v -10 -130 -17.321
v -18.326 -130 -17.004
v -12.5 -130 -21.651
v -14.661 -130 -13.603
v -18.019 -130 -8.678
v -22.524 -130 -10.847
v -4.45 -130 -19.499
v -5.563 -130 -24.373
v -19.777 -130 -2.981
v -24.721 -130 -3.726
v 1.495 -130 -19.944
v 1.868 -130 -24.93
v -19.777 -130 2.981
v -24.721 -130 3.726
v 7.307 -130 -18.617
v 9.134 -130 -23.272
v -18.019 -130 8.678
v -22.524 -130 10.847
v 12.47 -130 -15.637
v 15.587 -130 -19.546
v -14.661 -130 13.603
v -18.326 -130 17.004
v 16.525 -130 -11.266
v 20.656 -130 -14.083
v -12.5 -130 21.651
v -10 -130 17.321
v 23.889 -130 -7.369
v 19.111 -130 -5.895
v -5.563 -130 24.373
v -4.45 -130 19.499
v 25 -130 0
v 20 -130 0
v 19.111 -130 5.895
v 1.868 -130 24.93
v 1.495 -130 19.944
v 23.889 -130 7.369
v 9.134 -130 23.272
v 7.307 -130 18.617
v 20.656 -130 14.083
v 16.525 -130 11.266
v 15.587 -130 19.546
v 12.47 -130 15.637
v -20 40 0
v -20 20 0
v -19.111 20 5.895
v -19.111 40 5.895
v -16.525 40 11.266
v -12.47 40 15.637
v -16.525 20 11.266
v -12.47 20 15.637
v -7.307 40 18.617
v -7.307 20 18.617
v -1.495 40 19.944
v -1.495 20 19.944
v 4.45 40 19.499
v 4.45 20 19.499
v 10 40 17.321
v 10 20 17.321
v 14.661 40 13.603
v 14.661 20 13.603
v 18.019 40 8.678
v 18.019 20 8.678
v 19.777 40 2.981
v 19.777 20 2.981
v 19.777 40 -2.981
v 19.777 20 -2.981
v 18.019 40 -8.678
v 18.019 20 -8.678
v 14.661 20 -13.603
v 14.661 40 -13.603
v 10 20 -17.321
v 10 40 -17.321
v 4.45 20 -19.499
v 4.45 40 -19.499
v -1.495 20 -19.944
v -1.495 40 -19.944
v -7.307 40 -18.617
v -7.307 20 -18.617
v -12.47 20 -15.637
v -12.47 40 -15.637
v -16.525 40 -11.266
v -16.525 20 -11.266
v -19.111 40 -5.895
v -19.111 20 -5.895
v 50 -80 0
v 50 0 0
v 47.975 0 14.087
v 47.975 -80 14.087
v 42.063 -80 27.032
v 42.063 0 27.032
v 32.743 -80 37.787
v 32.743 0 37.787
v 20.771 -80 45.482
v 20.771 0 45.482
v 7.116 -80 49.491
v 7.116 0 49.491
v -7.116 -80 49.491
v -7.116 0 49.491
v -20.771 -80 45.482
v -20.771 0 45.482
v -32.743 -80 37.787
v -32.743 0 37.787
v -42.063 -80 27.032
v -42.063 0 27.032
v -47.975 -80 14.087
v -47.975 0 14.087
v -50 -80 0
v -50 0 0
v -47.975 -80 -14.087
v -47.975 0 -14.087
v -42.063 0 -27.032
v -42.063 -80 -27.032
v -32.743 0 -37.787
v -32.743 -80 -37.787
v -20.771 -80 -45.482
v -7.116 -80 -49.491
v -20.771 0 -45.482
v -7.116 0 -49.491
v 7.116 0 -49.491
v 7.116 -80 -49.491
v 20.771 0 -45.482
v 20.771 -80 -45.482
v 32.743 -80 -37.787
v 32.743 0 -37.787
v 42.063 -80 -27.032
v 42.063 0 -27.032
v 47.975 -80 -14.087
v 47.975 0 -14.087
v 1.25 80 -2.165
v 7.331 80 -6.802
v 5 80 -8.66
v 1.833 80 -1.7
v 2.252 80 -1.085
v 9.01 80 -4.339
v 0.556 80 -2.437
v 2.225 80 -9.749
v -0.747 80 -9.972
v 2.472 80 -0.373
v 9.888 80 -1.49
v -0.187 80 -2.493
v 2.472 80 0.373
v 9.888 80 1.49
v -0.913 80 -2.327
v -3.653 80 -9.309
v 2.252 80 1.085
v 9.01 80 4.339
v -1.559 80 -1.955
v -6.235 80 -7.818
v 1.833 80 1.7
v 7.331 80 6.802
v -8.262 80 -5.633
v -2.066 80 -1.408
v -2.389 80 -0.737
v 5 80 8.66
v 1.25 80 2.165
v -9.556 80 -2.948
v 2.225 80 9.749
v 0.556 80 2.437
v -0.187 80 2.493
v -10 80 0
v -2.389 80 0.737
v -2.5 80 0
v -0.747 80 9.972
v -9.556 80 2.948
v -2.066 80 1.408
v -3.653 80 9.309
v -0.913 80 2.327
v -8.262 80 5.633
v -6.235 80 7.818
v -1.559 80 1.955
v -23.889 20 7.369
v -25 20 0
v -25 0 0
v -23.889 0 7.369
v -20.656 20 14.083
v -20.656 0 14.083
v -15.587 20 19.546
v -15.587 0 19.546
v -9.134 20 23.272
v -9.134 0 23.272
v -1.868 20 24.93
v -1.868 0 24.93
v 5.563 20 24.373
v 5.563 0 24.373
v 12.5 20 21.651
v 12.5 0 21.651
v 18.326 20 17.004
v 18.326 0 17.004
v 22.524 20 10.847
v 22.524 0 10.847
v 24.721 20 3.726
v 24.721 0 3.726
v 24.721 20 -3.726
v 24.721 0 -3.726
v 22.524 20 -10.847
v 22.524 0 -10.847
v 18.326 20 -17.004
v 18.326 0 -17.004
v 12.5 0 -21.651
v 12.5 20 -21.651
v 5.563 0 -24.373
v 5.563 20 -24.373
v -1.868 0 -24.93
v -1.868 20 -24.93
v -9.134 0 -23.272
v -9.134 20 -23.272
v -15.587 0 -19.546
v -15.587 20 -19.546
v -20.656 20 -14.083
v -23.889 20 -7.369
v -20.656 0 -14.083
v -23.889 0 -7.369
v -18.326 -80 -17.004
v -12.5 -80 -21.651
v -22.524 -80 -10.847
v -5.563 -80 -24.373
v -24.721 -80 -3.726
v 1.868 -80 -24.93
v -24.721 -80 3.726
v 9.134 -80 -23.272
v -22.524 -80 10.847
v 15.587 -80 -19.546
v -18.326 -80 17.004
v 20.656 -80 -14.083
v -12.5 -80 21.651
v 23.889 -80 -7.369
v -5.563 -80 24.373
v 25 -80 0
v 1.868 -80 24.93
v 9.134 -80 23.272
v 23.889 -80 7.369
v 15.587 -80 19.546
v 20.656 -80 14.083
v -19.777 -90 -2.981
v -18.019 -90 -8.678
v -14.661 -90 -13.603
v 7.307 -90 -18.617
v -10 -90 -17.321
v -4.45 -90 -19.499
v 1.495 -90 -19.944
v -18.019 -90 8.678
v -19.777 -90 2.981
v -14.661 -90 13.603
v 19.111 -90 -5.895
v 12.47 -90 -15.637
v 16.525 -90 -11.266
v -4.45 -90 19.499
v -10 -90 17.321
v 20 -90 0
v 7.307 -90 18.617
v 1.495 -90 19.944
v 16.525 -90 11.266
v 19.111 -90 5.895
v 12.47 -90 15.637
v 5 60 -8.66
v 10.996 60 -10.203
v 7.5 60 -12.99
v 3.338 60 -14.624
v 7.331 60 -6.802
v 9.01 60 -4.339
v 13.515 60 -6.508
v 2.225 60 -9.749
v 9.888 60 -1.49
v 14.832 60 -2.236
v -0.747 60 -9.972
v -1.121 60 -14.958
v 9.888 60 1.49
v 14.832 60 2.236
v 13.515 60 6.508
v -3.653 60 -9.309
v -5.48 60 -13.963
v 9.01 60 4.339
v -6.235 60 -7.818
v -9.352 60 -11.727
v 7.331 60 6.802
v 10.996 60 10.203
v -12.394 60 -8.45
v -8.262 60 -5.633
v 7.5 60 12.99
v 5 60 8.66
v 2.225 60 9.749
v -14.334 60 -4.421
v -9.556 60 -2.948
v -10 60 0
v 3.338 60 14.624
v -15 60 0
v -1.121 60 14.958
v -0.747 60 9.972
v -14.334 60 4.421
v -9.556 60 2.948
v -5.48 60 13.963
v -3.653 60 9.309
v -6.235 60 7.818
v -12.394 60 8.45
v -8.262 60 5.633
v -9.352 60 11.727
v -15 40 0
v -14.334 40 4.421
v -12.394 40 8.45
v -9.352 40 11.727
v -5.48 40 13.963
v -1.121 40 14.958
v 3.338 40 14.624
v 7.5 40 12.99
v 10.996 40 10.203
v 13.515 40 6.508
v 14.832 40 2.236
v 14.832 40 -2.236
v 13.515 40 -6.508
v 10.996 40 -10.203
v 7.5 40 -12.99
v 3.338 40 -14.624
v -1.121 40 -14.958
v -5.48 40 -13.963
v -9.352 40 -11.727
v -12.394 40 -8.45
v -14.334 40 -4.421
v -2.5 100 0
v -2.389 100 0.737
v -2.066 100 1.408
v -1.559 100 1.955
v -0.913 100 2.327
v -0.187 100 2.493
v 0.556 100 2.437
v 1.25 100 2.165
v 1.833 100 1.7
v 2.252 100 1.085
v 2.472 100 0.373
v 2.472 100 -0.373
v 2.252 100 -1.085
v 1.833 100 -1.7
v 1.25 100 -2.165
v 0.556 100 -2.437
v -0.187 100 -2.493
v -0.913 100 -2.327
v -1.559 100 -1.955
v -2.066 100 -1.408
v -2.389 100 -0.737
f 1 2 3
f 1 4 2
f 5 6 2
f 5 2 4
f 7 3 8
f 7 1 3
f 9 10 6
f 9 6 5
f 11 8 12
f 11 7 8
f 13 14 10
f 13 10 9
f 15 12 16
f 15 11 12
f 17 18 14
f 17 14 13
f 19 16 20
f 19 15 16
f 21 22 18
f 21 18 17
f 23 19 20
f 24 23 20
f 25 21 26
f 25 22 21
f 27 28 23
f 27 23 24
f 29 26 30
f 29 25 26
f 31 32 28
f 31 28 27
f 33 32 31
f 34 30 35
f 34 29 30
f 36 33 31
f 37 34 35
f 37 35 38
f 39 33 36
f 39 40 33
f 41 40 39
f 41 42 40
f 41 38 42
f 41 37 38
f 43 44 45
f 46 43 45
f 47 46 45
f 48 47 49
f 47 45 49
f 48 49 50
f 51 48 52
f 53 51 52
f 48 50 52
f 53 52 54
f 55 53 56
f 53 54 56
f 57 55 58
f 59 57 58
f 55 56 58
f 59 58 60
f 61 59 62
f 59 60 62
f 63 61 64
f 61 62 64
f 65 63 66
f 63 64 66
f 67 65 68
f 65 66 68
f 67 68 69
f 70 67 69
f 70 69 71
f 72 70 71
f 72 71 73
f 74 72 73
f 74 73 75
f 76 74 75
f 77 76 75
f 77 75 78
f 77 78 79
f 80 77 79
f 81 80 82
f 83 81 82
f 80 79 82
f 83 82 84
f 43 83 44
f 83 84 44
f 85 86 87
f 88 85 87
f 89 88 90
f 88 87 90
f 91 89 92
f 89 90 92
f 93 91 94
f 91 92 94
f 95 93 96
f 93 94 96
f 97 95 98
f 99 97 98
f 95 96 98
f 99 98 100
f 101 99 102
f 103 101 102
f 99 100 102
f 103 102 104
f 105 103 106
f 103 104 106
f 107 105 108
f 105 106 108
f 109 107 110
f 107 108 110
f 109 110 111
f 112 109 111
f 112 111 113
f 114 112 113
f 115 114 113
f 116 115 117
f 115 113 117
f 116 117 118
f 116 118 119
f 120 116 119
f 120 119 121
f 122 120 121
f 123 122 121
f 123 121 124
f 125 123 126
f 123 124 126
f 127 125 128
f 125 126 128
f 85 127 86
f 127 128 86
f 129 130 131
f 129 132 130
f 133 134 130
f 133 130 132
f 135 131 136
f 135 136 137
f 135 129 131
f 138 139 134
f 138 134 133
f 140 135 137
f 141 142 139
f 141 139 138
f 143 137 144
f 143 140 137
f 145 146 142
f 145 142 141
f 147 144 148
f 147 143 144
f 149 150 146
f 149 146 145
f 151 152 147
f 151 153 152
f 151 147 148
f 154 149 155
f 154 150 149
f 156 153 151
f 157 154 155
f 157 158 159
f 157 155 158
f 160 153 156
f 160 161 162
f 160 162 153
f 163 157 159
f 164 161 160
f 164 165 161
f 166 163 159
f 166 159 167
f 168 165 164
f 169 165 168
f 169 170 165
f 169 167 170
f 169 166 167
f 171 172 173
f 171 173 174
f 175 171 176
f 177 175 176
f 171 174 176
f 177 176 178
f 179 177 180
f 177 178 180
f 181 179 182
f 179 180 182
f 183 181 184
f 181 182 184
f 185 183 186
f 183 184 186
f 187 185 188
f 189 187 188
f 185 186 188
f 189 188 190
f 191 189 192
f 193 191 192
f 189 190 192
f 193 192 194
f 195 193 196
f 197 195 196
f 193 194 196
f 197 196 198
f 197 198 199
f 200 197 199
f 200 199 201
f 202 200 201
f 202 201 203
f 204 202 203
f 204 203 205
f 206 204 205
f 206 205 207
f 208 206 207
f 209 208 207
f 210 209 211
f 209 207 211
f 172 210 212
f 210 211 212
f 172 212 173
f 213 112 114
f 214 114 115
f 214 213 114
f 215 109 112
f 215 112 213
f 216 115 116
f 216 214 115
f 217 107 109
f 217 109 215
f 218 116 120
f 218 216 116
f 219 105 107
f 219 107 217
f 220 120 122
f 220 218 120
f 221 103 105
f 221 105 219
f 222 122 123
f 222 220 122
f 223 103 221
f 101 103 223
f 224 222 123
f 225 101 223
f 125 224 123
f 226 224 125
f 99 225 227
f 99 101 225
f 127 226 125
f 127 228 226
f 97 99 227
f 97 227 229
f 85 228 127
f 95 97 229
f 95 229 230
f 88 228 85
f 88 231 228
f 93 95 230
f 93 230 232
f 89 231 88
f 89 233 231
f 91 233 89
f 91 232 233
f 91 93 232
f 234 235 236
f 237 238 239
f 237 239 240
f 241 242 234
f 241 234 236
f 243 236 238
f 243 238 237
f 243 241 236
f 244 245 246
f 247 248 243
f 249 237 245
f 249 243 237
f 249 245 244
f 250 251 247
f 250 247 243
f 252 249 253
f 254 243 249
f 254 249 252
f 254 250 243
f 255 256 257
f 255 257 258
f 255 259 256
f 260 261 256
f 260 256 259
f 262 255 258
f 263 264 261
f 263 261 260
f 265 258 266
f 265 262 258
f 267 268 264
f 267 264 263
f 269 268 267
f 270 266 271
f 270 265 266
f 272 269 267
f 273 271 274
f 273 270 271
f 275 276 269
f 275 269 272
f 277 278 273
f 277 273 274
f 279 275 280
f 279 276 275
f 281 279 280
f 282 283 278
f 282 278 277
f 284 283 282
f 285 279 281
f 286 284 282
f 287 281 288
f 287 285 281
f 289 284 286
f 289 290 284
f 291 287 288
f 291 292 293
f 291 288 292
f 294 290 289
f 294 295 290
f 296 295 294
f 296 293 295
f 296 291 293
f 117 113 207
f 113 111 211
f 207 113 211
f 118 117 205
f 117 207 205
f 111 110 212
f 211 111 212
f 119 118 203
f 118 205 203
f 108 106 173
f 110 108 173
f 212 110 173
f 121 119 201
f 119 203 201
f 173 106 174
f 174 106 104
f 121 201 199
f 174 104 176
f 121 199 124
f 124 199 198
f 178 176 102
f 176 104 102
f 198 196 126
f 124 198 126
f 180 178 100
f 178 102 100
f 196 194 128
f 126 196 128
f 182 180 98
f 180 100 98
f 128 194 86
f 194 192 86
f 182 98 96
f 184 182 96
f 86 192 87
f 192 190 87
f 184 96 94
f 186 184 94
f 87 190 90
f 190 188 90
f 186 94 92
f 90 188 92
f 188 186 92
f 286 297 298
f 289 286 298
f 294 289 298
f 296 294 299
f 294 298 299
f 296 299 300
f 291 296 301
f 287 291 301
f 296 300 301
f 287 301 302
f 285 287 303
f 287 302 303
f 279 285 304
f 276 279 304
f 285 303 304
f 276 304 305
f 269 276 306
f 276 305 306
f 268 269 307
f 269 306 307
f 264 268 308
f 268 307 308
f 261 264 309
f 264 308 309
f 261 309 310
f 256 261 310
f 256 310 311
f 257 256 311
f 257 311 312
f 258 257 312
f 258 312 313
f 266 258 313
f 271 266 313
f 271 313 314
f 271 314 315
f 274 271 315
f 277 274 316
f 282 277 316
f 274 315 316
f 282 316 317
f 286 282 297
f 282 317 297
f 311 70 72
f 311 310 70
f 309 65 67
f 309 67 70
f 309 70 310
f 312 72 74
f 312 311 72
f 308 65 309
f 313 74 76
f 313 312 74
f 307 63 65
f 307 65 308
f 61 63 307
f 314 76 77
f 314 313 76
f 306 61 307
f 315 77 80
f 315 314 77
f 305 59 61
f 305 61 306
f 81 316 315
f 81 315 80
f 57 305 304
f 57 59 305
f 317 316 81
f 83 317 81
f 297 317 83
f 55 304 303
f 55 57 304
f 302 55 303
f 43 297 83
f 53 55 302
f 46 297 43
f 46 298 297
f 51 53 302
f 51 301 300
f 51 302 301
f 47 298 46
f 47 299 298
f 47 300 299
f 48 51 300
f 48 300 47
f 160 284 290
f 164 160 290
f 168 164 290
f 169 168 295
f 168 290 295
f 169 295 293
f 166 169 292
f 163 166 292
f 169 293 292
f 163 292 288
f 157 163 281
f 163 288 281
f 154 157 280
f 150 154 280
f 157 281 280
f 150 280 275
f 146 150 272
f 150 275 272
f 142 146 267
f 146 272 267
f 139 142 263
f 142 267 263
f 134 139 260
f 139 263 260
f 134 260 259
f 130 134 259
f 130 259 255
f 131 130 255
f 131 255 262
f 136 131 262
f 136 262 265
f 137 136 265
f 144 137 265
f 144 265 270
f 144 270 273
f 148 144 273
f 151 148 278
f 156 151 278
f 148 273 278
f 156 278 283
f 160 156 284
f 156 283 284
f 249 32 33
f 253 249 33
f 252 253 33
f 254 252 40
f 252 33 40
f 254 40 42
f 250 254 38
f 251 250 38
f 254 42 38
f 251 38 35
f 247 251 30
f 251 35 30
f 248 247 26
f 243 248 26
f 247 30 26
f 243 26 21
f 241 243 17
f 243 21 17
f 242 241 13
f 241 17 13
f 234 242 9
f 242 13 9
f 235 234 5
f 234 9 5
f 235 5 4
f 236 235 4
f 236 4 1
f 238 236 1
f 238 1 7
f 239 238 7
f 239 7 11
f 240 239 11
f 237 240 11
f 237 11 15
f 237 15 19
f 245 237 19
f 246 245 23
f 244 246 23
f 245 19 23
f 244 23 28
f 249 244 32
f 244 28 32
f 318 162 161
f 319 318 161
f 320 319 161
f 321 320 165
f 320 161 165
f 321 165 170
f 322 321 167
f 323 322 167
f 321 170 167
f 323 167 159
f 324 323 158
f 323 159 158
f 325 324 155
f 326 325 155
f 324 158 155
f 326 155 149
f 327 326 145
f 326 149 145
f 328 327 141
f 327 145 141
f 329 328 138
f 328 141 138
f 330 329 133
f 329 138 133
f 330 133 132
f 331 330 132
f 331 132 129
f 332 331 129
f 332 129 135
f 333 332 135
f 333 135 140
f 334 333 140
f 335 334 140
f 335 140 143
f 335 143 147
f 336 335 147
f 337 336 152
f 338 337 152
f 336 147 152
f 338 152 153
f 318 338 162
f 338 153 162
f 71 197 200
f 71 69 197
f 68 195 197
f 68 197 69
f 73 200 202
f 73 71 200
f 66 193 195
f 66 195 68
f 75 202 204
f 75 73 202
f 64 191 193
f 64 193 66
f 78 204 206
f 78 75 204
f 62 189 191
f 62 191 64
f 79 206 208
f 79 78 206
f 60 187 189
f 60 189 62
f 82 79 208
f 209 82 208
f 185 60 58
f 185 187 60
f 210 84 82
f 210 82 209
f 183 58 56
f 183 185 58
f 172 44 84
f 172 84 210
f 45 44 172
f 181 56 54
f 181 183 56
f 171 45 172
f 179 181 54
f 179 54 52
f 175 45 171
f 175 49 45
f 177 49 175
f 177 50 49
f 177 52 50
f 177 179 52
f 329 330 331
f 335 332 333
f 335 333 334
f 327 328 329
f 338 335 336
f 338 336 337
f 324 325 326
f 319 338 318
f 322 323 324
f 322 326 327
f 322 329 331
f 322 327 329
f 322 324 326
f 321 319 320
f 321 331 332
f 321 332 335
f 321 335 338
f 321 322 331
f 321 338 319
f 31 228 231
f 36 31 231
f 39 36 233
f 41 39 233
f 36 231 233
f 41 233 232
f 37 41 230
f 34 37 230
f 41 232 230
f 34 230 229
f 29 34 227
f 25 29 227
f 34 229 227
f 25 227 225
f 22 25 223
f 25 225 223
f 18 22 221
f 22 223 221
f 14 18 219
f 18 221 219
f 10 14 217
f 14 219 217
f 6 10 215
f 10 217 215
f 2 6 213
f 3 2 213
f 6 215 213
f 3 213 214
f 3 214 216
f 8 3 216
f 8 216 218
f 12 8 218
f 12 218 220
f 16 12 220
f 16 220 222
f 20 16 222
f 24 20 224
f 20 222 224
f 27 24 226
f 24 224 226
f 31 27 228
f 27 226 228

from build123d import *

# Parameters (mm, degrees)
F0_R      = 50
F1_DEPTH  = 80
F2_R      = 25
F3_DEPTH  = 50
F4_R      = 20
F5_DEPTH  = 40
F6_R      = 25
F7_DEPTH  = 20
F8_R      = 20
F9_DEPTH  = 20
F10_R     = 15
F11_DEPTH = 20
F12_R     = 10
F13_DEPTH = 20
F14_R     = 2.5
F15_DEPTH = 20


with BuildPart() as f1:
    # F0 (on Front) → F1 (new body)
    with BuildSketch(Plane.XZ):
        Circle(F0_R)
    extrude(amount=F1_DEPTH)

    # F2 (on face) → F3 (join)
    with BuildSketch(Plane.XZ.offset(80)):
        Circle(F2_R)
    extrude(amount=F3_DEPTH)

    # F4 (on face) → F5 (cut)
    with BuildSketch(Plane.XZ.offset(130)):
        Circle(F4_R)
    extrude(amount=-F5_DEPTH, mode=Mode.SUBTRACT)

    # F6 (on face) → F7 (join)
    with BuildSketch(Plane(origin=(0, 0, 0), x_dir=(-1, 0, 0), z_dir=(0, 1, 0))):
        Circle(F6_R)
    extrude(amount=F7_DEPTH)

    # F8 (on face) → F9 (join)
    with BuildSketch(Plane(origin=(0, 20, 0), x_dir=(-1, 0, 0), z_dir=(0, 1, 0))):
        Circle(F8_R)
    extrude(amount=F9_DEPTH)

    # F10 (on face) → F11 (join)
    with BuildSketch(Plane(origin=(0, 40, 0), x_dir=(-1, 0, 0), z_dir=(0, 1, 0))):
        Circle(F10_R)
    extrude(amount=F11_DEPTH)

    # F12 (on face) → F13 (join)
    with BuildSketch(Plane(origin=(0, 60, 0), x_dir=(-1, 0, 0), z_dir=(0, 1, 0))):
        Circle(F12_R)
    extrude(amount=F13_DEPTH)

    # F14 (on face) → F15 (join)
    with BuildSketch(Plane(origin=(0, 80, 0), x_dir=(-1, 0, 0), z_dir=(0, 1, 0))):
        Circle(F14_R)
    extrude(amount=F15_DEPTH)


solid = f1.part
